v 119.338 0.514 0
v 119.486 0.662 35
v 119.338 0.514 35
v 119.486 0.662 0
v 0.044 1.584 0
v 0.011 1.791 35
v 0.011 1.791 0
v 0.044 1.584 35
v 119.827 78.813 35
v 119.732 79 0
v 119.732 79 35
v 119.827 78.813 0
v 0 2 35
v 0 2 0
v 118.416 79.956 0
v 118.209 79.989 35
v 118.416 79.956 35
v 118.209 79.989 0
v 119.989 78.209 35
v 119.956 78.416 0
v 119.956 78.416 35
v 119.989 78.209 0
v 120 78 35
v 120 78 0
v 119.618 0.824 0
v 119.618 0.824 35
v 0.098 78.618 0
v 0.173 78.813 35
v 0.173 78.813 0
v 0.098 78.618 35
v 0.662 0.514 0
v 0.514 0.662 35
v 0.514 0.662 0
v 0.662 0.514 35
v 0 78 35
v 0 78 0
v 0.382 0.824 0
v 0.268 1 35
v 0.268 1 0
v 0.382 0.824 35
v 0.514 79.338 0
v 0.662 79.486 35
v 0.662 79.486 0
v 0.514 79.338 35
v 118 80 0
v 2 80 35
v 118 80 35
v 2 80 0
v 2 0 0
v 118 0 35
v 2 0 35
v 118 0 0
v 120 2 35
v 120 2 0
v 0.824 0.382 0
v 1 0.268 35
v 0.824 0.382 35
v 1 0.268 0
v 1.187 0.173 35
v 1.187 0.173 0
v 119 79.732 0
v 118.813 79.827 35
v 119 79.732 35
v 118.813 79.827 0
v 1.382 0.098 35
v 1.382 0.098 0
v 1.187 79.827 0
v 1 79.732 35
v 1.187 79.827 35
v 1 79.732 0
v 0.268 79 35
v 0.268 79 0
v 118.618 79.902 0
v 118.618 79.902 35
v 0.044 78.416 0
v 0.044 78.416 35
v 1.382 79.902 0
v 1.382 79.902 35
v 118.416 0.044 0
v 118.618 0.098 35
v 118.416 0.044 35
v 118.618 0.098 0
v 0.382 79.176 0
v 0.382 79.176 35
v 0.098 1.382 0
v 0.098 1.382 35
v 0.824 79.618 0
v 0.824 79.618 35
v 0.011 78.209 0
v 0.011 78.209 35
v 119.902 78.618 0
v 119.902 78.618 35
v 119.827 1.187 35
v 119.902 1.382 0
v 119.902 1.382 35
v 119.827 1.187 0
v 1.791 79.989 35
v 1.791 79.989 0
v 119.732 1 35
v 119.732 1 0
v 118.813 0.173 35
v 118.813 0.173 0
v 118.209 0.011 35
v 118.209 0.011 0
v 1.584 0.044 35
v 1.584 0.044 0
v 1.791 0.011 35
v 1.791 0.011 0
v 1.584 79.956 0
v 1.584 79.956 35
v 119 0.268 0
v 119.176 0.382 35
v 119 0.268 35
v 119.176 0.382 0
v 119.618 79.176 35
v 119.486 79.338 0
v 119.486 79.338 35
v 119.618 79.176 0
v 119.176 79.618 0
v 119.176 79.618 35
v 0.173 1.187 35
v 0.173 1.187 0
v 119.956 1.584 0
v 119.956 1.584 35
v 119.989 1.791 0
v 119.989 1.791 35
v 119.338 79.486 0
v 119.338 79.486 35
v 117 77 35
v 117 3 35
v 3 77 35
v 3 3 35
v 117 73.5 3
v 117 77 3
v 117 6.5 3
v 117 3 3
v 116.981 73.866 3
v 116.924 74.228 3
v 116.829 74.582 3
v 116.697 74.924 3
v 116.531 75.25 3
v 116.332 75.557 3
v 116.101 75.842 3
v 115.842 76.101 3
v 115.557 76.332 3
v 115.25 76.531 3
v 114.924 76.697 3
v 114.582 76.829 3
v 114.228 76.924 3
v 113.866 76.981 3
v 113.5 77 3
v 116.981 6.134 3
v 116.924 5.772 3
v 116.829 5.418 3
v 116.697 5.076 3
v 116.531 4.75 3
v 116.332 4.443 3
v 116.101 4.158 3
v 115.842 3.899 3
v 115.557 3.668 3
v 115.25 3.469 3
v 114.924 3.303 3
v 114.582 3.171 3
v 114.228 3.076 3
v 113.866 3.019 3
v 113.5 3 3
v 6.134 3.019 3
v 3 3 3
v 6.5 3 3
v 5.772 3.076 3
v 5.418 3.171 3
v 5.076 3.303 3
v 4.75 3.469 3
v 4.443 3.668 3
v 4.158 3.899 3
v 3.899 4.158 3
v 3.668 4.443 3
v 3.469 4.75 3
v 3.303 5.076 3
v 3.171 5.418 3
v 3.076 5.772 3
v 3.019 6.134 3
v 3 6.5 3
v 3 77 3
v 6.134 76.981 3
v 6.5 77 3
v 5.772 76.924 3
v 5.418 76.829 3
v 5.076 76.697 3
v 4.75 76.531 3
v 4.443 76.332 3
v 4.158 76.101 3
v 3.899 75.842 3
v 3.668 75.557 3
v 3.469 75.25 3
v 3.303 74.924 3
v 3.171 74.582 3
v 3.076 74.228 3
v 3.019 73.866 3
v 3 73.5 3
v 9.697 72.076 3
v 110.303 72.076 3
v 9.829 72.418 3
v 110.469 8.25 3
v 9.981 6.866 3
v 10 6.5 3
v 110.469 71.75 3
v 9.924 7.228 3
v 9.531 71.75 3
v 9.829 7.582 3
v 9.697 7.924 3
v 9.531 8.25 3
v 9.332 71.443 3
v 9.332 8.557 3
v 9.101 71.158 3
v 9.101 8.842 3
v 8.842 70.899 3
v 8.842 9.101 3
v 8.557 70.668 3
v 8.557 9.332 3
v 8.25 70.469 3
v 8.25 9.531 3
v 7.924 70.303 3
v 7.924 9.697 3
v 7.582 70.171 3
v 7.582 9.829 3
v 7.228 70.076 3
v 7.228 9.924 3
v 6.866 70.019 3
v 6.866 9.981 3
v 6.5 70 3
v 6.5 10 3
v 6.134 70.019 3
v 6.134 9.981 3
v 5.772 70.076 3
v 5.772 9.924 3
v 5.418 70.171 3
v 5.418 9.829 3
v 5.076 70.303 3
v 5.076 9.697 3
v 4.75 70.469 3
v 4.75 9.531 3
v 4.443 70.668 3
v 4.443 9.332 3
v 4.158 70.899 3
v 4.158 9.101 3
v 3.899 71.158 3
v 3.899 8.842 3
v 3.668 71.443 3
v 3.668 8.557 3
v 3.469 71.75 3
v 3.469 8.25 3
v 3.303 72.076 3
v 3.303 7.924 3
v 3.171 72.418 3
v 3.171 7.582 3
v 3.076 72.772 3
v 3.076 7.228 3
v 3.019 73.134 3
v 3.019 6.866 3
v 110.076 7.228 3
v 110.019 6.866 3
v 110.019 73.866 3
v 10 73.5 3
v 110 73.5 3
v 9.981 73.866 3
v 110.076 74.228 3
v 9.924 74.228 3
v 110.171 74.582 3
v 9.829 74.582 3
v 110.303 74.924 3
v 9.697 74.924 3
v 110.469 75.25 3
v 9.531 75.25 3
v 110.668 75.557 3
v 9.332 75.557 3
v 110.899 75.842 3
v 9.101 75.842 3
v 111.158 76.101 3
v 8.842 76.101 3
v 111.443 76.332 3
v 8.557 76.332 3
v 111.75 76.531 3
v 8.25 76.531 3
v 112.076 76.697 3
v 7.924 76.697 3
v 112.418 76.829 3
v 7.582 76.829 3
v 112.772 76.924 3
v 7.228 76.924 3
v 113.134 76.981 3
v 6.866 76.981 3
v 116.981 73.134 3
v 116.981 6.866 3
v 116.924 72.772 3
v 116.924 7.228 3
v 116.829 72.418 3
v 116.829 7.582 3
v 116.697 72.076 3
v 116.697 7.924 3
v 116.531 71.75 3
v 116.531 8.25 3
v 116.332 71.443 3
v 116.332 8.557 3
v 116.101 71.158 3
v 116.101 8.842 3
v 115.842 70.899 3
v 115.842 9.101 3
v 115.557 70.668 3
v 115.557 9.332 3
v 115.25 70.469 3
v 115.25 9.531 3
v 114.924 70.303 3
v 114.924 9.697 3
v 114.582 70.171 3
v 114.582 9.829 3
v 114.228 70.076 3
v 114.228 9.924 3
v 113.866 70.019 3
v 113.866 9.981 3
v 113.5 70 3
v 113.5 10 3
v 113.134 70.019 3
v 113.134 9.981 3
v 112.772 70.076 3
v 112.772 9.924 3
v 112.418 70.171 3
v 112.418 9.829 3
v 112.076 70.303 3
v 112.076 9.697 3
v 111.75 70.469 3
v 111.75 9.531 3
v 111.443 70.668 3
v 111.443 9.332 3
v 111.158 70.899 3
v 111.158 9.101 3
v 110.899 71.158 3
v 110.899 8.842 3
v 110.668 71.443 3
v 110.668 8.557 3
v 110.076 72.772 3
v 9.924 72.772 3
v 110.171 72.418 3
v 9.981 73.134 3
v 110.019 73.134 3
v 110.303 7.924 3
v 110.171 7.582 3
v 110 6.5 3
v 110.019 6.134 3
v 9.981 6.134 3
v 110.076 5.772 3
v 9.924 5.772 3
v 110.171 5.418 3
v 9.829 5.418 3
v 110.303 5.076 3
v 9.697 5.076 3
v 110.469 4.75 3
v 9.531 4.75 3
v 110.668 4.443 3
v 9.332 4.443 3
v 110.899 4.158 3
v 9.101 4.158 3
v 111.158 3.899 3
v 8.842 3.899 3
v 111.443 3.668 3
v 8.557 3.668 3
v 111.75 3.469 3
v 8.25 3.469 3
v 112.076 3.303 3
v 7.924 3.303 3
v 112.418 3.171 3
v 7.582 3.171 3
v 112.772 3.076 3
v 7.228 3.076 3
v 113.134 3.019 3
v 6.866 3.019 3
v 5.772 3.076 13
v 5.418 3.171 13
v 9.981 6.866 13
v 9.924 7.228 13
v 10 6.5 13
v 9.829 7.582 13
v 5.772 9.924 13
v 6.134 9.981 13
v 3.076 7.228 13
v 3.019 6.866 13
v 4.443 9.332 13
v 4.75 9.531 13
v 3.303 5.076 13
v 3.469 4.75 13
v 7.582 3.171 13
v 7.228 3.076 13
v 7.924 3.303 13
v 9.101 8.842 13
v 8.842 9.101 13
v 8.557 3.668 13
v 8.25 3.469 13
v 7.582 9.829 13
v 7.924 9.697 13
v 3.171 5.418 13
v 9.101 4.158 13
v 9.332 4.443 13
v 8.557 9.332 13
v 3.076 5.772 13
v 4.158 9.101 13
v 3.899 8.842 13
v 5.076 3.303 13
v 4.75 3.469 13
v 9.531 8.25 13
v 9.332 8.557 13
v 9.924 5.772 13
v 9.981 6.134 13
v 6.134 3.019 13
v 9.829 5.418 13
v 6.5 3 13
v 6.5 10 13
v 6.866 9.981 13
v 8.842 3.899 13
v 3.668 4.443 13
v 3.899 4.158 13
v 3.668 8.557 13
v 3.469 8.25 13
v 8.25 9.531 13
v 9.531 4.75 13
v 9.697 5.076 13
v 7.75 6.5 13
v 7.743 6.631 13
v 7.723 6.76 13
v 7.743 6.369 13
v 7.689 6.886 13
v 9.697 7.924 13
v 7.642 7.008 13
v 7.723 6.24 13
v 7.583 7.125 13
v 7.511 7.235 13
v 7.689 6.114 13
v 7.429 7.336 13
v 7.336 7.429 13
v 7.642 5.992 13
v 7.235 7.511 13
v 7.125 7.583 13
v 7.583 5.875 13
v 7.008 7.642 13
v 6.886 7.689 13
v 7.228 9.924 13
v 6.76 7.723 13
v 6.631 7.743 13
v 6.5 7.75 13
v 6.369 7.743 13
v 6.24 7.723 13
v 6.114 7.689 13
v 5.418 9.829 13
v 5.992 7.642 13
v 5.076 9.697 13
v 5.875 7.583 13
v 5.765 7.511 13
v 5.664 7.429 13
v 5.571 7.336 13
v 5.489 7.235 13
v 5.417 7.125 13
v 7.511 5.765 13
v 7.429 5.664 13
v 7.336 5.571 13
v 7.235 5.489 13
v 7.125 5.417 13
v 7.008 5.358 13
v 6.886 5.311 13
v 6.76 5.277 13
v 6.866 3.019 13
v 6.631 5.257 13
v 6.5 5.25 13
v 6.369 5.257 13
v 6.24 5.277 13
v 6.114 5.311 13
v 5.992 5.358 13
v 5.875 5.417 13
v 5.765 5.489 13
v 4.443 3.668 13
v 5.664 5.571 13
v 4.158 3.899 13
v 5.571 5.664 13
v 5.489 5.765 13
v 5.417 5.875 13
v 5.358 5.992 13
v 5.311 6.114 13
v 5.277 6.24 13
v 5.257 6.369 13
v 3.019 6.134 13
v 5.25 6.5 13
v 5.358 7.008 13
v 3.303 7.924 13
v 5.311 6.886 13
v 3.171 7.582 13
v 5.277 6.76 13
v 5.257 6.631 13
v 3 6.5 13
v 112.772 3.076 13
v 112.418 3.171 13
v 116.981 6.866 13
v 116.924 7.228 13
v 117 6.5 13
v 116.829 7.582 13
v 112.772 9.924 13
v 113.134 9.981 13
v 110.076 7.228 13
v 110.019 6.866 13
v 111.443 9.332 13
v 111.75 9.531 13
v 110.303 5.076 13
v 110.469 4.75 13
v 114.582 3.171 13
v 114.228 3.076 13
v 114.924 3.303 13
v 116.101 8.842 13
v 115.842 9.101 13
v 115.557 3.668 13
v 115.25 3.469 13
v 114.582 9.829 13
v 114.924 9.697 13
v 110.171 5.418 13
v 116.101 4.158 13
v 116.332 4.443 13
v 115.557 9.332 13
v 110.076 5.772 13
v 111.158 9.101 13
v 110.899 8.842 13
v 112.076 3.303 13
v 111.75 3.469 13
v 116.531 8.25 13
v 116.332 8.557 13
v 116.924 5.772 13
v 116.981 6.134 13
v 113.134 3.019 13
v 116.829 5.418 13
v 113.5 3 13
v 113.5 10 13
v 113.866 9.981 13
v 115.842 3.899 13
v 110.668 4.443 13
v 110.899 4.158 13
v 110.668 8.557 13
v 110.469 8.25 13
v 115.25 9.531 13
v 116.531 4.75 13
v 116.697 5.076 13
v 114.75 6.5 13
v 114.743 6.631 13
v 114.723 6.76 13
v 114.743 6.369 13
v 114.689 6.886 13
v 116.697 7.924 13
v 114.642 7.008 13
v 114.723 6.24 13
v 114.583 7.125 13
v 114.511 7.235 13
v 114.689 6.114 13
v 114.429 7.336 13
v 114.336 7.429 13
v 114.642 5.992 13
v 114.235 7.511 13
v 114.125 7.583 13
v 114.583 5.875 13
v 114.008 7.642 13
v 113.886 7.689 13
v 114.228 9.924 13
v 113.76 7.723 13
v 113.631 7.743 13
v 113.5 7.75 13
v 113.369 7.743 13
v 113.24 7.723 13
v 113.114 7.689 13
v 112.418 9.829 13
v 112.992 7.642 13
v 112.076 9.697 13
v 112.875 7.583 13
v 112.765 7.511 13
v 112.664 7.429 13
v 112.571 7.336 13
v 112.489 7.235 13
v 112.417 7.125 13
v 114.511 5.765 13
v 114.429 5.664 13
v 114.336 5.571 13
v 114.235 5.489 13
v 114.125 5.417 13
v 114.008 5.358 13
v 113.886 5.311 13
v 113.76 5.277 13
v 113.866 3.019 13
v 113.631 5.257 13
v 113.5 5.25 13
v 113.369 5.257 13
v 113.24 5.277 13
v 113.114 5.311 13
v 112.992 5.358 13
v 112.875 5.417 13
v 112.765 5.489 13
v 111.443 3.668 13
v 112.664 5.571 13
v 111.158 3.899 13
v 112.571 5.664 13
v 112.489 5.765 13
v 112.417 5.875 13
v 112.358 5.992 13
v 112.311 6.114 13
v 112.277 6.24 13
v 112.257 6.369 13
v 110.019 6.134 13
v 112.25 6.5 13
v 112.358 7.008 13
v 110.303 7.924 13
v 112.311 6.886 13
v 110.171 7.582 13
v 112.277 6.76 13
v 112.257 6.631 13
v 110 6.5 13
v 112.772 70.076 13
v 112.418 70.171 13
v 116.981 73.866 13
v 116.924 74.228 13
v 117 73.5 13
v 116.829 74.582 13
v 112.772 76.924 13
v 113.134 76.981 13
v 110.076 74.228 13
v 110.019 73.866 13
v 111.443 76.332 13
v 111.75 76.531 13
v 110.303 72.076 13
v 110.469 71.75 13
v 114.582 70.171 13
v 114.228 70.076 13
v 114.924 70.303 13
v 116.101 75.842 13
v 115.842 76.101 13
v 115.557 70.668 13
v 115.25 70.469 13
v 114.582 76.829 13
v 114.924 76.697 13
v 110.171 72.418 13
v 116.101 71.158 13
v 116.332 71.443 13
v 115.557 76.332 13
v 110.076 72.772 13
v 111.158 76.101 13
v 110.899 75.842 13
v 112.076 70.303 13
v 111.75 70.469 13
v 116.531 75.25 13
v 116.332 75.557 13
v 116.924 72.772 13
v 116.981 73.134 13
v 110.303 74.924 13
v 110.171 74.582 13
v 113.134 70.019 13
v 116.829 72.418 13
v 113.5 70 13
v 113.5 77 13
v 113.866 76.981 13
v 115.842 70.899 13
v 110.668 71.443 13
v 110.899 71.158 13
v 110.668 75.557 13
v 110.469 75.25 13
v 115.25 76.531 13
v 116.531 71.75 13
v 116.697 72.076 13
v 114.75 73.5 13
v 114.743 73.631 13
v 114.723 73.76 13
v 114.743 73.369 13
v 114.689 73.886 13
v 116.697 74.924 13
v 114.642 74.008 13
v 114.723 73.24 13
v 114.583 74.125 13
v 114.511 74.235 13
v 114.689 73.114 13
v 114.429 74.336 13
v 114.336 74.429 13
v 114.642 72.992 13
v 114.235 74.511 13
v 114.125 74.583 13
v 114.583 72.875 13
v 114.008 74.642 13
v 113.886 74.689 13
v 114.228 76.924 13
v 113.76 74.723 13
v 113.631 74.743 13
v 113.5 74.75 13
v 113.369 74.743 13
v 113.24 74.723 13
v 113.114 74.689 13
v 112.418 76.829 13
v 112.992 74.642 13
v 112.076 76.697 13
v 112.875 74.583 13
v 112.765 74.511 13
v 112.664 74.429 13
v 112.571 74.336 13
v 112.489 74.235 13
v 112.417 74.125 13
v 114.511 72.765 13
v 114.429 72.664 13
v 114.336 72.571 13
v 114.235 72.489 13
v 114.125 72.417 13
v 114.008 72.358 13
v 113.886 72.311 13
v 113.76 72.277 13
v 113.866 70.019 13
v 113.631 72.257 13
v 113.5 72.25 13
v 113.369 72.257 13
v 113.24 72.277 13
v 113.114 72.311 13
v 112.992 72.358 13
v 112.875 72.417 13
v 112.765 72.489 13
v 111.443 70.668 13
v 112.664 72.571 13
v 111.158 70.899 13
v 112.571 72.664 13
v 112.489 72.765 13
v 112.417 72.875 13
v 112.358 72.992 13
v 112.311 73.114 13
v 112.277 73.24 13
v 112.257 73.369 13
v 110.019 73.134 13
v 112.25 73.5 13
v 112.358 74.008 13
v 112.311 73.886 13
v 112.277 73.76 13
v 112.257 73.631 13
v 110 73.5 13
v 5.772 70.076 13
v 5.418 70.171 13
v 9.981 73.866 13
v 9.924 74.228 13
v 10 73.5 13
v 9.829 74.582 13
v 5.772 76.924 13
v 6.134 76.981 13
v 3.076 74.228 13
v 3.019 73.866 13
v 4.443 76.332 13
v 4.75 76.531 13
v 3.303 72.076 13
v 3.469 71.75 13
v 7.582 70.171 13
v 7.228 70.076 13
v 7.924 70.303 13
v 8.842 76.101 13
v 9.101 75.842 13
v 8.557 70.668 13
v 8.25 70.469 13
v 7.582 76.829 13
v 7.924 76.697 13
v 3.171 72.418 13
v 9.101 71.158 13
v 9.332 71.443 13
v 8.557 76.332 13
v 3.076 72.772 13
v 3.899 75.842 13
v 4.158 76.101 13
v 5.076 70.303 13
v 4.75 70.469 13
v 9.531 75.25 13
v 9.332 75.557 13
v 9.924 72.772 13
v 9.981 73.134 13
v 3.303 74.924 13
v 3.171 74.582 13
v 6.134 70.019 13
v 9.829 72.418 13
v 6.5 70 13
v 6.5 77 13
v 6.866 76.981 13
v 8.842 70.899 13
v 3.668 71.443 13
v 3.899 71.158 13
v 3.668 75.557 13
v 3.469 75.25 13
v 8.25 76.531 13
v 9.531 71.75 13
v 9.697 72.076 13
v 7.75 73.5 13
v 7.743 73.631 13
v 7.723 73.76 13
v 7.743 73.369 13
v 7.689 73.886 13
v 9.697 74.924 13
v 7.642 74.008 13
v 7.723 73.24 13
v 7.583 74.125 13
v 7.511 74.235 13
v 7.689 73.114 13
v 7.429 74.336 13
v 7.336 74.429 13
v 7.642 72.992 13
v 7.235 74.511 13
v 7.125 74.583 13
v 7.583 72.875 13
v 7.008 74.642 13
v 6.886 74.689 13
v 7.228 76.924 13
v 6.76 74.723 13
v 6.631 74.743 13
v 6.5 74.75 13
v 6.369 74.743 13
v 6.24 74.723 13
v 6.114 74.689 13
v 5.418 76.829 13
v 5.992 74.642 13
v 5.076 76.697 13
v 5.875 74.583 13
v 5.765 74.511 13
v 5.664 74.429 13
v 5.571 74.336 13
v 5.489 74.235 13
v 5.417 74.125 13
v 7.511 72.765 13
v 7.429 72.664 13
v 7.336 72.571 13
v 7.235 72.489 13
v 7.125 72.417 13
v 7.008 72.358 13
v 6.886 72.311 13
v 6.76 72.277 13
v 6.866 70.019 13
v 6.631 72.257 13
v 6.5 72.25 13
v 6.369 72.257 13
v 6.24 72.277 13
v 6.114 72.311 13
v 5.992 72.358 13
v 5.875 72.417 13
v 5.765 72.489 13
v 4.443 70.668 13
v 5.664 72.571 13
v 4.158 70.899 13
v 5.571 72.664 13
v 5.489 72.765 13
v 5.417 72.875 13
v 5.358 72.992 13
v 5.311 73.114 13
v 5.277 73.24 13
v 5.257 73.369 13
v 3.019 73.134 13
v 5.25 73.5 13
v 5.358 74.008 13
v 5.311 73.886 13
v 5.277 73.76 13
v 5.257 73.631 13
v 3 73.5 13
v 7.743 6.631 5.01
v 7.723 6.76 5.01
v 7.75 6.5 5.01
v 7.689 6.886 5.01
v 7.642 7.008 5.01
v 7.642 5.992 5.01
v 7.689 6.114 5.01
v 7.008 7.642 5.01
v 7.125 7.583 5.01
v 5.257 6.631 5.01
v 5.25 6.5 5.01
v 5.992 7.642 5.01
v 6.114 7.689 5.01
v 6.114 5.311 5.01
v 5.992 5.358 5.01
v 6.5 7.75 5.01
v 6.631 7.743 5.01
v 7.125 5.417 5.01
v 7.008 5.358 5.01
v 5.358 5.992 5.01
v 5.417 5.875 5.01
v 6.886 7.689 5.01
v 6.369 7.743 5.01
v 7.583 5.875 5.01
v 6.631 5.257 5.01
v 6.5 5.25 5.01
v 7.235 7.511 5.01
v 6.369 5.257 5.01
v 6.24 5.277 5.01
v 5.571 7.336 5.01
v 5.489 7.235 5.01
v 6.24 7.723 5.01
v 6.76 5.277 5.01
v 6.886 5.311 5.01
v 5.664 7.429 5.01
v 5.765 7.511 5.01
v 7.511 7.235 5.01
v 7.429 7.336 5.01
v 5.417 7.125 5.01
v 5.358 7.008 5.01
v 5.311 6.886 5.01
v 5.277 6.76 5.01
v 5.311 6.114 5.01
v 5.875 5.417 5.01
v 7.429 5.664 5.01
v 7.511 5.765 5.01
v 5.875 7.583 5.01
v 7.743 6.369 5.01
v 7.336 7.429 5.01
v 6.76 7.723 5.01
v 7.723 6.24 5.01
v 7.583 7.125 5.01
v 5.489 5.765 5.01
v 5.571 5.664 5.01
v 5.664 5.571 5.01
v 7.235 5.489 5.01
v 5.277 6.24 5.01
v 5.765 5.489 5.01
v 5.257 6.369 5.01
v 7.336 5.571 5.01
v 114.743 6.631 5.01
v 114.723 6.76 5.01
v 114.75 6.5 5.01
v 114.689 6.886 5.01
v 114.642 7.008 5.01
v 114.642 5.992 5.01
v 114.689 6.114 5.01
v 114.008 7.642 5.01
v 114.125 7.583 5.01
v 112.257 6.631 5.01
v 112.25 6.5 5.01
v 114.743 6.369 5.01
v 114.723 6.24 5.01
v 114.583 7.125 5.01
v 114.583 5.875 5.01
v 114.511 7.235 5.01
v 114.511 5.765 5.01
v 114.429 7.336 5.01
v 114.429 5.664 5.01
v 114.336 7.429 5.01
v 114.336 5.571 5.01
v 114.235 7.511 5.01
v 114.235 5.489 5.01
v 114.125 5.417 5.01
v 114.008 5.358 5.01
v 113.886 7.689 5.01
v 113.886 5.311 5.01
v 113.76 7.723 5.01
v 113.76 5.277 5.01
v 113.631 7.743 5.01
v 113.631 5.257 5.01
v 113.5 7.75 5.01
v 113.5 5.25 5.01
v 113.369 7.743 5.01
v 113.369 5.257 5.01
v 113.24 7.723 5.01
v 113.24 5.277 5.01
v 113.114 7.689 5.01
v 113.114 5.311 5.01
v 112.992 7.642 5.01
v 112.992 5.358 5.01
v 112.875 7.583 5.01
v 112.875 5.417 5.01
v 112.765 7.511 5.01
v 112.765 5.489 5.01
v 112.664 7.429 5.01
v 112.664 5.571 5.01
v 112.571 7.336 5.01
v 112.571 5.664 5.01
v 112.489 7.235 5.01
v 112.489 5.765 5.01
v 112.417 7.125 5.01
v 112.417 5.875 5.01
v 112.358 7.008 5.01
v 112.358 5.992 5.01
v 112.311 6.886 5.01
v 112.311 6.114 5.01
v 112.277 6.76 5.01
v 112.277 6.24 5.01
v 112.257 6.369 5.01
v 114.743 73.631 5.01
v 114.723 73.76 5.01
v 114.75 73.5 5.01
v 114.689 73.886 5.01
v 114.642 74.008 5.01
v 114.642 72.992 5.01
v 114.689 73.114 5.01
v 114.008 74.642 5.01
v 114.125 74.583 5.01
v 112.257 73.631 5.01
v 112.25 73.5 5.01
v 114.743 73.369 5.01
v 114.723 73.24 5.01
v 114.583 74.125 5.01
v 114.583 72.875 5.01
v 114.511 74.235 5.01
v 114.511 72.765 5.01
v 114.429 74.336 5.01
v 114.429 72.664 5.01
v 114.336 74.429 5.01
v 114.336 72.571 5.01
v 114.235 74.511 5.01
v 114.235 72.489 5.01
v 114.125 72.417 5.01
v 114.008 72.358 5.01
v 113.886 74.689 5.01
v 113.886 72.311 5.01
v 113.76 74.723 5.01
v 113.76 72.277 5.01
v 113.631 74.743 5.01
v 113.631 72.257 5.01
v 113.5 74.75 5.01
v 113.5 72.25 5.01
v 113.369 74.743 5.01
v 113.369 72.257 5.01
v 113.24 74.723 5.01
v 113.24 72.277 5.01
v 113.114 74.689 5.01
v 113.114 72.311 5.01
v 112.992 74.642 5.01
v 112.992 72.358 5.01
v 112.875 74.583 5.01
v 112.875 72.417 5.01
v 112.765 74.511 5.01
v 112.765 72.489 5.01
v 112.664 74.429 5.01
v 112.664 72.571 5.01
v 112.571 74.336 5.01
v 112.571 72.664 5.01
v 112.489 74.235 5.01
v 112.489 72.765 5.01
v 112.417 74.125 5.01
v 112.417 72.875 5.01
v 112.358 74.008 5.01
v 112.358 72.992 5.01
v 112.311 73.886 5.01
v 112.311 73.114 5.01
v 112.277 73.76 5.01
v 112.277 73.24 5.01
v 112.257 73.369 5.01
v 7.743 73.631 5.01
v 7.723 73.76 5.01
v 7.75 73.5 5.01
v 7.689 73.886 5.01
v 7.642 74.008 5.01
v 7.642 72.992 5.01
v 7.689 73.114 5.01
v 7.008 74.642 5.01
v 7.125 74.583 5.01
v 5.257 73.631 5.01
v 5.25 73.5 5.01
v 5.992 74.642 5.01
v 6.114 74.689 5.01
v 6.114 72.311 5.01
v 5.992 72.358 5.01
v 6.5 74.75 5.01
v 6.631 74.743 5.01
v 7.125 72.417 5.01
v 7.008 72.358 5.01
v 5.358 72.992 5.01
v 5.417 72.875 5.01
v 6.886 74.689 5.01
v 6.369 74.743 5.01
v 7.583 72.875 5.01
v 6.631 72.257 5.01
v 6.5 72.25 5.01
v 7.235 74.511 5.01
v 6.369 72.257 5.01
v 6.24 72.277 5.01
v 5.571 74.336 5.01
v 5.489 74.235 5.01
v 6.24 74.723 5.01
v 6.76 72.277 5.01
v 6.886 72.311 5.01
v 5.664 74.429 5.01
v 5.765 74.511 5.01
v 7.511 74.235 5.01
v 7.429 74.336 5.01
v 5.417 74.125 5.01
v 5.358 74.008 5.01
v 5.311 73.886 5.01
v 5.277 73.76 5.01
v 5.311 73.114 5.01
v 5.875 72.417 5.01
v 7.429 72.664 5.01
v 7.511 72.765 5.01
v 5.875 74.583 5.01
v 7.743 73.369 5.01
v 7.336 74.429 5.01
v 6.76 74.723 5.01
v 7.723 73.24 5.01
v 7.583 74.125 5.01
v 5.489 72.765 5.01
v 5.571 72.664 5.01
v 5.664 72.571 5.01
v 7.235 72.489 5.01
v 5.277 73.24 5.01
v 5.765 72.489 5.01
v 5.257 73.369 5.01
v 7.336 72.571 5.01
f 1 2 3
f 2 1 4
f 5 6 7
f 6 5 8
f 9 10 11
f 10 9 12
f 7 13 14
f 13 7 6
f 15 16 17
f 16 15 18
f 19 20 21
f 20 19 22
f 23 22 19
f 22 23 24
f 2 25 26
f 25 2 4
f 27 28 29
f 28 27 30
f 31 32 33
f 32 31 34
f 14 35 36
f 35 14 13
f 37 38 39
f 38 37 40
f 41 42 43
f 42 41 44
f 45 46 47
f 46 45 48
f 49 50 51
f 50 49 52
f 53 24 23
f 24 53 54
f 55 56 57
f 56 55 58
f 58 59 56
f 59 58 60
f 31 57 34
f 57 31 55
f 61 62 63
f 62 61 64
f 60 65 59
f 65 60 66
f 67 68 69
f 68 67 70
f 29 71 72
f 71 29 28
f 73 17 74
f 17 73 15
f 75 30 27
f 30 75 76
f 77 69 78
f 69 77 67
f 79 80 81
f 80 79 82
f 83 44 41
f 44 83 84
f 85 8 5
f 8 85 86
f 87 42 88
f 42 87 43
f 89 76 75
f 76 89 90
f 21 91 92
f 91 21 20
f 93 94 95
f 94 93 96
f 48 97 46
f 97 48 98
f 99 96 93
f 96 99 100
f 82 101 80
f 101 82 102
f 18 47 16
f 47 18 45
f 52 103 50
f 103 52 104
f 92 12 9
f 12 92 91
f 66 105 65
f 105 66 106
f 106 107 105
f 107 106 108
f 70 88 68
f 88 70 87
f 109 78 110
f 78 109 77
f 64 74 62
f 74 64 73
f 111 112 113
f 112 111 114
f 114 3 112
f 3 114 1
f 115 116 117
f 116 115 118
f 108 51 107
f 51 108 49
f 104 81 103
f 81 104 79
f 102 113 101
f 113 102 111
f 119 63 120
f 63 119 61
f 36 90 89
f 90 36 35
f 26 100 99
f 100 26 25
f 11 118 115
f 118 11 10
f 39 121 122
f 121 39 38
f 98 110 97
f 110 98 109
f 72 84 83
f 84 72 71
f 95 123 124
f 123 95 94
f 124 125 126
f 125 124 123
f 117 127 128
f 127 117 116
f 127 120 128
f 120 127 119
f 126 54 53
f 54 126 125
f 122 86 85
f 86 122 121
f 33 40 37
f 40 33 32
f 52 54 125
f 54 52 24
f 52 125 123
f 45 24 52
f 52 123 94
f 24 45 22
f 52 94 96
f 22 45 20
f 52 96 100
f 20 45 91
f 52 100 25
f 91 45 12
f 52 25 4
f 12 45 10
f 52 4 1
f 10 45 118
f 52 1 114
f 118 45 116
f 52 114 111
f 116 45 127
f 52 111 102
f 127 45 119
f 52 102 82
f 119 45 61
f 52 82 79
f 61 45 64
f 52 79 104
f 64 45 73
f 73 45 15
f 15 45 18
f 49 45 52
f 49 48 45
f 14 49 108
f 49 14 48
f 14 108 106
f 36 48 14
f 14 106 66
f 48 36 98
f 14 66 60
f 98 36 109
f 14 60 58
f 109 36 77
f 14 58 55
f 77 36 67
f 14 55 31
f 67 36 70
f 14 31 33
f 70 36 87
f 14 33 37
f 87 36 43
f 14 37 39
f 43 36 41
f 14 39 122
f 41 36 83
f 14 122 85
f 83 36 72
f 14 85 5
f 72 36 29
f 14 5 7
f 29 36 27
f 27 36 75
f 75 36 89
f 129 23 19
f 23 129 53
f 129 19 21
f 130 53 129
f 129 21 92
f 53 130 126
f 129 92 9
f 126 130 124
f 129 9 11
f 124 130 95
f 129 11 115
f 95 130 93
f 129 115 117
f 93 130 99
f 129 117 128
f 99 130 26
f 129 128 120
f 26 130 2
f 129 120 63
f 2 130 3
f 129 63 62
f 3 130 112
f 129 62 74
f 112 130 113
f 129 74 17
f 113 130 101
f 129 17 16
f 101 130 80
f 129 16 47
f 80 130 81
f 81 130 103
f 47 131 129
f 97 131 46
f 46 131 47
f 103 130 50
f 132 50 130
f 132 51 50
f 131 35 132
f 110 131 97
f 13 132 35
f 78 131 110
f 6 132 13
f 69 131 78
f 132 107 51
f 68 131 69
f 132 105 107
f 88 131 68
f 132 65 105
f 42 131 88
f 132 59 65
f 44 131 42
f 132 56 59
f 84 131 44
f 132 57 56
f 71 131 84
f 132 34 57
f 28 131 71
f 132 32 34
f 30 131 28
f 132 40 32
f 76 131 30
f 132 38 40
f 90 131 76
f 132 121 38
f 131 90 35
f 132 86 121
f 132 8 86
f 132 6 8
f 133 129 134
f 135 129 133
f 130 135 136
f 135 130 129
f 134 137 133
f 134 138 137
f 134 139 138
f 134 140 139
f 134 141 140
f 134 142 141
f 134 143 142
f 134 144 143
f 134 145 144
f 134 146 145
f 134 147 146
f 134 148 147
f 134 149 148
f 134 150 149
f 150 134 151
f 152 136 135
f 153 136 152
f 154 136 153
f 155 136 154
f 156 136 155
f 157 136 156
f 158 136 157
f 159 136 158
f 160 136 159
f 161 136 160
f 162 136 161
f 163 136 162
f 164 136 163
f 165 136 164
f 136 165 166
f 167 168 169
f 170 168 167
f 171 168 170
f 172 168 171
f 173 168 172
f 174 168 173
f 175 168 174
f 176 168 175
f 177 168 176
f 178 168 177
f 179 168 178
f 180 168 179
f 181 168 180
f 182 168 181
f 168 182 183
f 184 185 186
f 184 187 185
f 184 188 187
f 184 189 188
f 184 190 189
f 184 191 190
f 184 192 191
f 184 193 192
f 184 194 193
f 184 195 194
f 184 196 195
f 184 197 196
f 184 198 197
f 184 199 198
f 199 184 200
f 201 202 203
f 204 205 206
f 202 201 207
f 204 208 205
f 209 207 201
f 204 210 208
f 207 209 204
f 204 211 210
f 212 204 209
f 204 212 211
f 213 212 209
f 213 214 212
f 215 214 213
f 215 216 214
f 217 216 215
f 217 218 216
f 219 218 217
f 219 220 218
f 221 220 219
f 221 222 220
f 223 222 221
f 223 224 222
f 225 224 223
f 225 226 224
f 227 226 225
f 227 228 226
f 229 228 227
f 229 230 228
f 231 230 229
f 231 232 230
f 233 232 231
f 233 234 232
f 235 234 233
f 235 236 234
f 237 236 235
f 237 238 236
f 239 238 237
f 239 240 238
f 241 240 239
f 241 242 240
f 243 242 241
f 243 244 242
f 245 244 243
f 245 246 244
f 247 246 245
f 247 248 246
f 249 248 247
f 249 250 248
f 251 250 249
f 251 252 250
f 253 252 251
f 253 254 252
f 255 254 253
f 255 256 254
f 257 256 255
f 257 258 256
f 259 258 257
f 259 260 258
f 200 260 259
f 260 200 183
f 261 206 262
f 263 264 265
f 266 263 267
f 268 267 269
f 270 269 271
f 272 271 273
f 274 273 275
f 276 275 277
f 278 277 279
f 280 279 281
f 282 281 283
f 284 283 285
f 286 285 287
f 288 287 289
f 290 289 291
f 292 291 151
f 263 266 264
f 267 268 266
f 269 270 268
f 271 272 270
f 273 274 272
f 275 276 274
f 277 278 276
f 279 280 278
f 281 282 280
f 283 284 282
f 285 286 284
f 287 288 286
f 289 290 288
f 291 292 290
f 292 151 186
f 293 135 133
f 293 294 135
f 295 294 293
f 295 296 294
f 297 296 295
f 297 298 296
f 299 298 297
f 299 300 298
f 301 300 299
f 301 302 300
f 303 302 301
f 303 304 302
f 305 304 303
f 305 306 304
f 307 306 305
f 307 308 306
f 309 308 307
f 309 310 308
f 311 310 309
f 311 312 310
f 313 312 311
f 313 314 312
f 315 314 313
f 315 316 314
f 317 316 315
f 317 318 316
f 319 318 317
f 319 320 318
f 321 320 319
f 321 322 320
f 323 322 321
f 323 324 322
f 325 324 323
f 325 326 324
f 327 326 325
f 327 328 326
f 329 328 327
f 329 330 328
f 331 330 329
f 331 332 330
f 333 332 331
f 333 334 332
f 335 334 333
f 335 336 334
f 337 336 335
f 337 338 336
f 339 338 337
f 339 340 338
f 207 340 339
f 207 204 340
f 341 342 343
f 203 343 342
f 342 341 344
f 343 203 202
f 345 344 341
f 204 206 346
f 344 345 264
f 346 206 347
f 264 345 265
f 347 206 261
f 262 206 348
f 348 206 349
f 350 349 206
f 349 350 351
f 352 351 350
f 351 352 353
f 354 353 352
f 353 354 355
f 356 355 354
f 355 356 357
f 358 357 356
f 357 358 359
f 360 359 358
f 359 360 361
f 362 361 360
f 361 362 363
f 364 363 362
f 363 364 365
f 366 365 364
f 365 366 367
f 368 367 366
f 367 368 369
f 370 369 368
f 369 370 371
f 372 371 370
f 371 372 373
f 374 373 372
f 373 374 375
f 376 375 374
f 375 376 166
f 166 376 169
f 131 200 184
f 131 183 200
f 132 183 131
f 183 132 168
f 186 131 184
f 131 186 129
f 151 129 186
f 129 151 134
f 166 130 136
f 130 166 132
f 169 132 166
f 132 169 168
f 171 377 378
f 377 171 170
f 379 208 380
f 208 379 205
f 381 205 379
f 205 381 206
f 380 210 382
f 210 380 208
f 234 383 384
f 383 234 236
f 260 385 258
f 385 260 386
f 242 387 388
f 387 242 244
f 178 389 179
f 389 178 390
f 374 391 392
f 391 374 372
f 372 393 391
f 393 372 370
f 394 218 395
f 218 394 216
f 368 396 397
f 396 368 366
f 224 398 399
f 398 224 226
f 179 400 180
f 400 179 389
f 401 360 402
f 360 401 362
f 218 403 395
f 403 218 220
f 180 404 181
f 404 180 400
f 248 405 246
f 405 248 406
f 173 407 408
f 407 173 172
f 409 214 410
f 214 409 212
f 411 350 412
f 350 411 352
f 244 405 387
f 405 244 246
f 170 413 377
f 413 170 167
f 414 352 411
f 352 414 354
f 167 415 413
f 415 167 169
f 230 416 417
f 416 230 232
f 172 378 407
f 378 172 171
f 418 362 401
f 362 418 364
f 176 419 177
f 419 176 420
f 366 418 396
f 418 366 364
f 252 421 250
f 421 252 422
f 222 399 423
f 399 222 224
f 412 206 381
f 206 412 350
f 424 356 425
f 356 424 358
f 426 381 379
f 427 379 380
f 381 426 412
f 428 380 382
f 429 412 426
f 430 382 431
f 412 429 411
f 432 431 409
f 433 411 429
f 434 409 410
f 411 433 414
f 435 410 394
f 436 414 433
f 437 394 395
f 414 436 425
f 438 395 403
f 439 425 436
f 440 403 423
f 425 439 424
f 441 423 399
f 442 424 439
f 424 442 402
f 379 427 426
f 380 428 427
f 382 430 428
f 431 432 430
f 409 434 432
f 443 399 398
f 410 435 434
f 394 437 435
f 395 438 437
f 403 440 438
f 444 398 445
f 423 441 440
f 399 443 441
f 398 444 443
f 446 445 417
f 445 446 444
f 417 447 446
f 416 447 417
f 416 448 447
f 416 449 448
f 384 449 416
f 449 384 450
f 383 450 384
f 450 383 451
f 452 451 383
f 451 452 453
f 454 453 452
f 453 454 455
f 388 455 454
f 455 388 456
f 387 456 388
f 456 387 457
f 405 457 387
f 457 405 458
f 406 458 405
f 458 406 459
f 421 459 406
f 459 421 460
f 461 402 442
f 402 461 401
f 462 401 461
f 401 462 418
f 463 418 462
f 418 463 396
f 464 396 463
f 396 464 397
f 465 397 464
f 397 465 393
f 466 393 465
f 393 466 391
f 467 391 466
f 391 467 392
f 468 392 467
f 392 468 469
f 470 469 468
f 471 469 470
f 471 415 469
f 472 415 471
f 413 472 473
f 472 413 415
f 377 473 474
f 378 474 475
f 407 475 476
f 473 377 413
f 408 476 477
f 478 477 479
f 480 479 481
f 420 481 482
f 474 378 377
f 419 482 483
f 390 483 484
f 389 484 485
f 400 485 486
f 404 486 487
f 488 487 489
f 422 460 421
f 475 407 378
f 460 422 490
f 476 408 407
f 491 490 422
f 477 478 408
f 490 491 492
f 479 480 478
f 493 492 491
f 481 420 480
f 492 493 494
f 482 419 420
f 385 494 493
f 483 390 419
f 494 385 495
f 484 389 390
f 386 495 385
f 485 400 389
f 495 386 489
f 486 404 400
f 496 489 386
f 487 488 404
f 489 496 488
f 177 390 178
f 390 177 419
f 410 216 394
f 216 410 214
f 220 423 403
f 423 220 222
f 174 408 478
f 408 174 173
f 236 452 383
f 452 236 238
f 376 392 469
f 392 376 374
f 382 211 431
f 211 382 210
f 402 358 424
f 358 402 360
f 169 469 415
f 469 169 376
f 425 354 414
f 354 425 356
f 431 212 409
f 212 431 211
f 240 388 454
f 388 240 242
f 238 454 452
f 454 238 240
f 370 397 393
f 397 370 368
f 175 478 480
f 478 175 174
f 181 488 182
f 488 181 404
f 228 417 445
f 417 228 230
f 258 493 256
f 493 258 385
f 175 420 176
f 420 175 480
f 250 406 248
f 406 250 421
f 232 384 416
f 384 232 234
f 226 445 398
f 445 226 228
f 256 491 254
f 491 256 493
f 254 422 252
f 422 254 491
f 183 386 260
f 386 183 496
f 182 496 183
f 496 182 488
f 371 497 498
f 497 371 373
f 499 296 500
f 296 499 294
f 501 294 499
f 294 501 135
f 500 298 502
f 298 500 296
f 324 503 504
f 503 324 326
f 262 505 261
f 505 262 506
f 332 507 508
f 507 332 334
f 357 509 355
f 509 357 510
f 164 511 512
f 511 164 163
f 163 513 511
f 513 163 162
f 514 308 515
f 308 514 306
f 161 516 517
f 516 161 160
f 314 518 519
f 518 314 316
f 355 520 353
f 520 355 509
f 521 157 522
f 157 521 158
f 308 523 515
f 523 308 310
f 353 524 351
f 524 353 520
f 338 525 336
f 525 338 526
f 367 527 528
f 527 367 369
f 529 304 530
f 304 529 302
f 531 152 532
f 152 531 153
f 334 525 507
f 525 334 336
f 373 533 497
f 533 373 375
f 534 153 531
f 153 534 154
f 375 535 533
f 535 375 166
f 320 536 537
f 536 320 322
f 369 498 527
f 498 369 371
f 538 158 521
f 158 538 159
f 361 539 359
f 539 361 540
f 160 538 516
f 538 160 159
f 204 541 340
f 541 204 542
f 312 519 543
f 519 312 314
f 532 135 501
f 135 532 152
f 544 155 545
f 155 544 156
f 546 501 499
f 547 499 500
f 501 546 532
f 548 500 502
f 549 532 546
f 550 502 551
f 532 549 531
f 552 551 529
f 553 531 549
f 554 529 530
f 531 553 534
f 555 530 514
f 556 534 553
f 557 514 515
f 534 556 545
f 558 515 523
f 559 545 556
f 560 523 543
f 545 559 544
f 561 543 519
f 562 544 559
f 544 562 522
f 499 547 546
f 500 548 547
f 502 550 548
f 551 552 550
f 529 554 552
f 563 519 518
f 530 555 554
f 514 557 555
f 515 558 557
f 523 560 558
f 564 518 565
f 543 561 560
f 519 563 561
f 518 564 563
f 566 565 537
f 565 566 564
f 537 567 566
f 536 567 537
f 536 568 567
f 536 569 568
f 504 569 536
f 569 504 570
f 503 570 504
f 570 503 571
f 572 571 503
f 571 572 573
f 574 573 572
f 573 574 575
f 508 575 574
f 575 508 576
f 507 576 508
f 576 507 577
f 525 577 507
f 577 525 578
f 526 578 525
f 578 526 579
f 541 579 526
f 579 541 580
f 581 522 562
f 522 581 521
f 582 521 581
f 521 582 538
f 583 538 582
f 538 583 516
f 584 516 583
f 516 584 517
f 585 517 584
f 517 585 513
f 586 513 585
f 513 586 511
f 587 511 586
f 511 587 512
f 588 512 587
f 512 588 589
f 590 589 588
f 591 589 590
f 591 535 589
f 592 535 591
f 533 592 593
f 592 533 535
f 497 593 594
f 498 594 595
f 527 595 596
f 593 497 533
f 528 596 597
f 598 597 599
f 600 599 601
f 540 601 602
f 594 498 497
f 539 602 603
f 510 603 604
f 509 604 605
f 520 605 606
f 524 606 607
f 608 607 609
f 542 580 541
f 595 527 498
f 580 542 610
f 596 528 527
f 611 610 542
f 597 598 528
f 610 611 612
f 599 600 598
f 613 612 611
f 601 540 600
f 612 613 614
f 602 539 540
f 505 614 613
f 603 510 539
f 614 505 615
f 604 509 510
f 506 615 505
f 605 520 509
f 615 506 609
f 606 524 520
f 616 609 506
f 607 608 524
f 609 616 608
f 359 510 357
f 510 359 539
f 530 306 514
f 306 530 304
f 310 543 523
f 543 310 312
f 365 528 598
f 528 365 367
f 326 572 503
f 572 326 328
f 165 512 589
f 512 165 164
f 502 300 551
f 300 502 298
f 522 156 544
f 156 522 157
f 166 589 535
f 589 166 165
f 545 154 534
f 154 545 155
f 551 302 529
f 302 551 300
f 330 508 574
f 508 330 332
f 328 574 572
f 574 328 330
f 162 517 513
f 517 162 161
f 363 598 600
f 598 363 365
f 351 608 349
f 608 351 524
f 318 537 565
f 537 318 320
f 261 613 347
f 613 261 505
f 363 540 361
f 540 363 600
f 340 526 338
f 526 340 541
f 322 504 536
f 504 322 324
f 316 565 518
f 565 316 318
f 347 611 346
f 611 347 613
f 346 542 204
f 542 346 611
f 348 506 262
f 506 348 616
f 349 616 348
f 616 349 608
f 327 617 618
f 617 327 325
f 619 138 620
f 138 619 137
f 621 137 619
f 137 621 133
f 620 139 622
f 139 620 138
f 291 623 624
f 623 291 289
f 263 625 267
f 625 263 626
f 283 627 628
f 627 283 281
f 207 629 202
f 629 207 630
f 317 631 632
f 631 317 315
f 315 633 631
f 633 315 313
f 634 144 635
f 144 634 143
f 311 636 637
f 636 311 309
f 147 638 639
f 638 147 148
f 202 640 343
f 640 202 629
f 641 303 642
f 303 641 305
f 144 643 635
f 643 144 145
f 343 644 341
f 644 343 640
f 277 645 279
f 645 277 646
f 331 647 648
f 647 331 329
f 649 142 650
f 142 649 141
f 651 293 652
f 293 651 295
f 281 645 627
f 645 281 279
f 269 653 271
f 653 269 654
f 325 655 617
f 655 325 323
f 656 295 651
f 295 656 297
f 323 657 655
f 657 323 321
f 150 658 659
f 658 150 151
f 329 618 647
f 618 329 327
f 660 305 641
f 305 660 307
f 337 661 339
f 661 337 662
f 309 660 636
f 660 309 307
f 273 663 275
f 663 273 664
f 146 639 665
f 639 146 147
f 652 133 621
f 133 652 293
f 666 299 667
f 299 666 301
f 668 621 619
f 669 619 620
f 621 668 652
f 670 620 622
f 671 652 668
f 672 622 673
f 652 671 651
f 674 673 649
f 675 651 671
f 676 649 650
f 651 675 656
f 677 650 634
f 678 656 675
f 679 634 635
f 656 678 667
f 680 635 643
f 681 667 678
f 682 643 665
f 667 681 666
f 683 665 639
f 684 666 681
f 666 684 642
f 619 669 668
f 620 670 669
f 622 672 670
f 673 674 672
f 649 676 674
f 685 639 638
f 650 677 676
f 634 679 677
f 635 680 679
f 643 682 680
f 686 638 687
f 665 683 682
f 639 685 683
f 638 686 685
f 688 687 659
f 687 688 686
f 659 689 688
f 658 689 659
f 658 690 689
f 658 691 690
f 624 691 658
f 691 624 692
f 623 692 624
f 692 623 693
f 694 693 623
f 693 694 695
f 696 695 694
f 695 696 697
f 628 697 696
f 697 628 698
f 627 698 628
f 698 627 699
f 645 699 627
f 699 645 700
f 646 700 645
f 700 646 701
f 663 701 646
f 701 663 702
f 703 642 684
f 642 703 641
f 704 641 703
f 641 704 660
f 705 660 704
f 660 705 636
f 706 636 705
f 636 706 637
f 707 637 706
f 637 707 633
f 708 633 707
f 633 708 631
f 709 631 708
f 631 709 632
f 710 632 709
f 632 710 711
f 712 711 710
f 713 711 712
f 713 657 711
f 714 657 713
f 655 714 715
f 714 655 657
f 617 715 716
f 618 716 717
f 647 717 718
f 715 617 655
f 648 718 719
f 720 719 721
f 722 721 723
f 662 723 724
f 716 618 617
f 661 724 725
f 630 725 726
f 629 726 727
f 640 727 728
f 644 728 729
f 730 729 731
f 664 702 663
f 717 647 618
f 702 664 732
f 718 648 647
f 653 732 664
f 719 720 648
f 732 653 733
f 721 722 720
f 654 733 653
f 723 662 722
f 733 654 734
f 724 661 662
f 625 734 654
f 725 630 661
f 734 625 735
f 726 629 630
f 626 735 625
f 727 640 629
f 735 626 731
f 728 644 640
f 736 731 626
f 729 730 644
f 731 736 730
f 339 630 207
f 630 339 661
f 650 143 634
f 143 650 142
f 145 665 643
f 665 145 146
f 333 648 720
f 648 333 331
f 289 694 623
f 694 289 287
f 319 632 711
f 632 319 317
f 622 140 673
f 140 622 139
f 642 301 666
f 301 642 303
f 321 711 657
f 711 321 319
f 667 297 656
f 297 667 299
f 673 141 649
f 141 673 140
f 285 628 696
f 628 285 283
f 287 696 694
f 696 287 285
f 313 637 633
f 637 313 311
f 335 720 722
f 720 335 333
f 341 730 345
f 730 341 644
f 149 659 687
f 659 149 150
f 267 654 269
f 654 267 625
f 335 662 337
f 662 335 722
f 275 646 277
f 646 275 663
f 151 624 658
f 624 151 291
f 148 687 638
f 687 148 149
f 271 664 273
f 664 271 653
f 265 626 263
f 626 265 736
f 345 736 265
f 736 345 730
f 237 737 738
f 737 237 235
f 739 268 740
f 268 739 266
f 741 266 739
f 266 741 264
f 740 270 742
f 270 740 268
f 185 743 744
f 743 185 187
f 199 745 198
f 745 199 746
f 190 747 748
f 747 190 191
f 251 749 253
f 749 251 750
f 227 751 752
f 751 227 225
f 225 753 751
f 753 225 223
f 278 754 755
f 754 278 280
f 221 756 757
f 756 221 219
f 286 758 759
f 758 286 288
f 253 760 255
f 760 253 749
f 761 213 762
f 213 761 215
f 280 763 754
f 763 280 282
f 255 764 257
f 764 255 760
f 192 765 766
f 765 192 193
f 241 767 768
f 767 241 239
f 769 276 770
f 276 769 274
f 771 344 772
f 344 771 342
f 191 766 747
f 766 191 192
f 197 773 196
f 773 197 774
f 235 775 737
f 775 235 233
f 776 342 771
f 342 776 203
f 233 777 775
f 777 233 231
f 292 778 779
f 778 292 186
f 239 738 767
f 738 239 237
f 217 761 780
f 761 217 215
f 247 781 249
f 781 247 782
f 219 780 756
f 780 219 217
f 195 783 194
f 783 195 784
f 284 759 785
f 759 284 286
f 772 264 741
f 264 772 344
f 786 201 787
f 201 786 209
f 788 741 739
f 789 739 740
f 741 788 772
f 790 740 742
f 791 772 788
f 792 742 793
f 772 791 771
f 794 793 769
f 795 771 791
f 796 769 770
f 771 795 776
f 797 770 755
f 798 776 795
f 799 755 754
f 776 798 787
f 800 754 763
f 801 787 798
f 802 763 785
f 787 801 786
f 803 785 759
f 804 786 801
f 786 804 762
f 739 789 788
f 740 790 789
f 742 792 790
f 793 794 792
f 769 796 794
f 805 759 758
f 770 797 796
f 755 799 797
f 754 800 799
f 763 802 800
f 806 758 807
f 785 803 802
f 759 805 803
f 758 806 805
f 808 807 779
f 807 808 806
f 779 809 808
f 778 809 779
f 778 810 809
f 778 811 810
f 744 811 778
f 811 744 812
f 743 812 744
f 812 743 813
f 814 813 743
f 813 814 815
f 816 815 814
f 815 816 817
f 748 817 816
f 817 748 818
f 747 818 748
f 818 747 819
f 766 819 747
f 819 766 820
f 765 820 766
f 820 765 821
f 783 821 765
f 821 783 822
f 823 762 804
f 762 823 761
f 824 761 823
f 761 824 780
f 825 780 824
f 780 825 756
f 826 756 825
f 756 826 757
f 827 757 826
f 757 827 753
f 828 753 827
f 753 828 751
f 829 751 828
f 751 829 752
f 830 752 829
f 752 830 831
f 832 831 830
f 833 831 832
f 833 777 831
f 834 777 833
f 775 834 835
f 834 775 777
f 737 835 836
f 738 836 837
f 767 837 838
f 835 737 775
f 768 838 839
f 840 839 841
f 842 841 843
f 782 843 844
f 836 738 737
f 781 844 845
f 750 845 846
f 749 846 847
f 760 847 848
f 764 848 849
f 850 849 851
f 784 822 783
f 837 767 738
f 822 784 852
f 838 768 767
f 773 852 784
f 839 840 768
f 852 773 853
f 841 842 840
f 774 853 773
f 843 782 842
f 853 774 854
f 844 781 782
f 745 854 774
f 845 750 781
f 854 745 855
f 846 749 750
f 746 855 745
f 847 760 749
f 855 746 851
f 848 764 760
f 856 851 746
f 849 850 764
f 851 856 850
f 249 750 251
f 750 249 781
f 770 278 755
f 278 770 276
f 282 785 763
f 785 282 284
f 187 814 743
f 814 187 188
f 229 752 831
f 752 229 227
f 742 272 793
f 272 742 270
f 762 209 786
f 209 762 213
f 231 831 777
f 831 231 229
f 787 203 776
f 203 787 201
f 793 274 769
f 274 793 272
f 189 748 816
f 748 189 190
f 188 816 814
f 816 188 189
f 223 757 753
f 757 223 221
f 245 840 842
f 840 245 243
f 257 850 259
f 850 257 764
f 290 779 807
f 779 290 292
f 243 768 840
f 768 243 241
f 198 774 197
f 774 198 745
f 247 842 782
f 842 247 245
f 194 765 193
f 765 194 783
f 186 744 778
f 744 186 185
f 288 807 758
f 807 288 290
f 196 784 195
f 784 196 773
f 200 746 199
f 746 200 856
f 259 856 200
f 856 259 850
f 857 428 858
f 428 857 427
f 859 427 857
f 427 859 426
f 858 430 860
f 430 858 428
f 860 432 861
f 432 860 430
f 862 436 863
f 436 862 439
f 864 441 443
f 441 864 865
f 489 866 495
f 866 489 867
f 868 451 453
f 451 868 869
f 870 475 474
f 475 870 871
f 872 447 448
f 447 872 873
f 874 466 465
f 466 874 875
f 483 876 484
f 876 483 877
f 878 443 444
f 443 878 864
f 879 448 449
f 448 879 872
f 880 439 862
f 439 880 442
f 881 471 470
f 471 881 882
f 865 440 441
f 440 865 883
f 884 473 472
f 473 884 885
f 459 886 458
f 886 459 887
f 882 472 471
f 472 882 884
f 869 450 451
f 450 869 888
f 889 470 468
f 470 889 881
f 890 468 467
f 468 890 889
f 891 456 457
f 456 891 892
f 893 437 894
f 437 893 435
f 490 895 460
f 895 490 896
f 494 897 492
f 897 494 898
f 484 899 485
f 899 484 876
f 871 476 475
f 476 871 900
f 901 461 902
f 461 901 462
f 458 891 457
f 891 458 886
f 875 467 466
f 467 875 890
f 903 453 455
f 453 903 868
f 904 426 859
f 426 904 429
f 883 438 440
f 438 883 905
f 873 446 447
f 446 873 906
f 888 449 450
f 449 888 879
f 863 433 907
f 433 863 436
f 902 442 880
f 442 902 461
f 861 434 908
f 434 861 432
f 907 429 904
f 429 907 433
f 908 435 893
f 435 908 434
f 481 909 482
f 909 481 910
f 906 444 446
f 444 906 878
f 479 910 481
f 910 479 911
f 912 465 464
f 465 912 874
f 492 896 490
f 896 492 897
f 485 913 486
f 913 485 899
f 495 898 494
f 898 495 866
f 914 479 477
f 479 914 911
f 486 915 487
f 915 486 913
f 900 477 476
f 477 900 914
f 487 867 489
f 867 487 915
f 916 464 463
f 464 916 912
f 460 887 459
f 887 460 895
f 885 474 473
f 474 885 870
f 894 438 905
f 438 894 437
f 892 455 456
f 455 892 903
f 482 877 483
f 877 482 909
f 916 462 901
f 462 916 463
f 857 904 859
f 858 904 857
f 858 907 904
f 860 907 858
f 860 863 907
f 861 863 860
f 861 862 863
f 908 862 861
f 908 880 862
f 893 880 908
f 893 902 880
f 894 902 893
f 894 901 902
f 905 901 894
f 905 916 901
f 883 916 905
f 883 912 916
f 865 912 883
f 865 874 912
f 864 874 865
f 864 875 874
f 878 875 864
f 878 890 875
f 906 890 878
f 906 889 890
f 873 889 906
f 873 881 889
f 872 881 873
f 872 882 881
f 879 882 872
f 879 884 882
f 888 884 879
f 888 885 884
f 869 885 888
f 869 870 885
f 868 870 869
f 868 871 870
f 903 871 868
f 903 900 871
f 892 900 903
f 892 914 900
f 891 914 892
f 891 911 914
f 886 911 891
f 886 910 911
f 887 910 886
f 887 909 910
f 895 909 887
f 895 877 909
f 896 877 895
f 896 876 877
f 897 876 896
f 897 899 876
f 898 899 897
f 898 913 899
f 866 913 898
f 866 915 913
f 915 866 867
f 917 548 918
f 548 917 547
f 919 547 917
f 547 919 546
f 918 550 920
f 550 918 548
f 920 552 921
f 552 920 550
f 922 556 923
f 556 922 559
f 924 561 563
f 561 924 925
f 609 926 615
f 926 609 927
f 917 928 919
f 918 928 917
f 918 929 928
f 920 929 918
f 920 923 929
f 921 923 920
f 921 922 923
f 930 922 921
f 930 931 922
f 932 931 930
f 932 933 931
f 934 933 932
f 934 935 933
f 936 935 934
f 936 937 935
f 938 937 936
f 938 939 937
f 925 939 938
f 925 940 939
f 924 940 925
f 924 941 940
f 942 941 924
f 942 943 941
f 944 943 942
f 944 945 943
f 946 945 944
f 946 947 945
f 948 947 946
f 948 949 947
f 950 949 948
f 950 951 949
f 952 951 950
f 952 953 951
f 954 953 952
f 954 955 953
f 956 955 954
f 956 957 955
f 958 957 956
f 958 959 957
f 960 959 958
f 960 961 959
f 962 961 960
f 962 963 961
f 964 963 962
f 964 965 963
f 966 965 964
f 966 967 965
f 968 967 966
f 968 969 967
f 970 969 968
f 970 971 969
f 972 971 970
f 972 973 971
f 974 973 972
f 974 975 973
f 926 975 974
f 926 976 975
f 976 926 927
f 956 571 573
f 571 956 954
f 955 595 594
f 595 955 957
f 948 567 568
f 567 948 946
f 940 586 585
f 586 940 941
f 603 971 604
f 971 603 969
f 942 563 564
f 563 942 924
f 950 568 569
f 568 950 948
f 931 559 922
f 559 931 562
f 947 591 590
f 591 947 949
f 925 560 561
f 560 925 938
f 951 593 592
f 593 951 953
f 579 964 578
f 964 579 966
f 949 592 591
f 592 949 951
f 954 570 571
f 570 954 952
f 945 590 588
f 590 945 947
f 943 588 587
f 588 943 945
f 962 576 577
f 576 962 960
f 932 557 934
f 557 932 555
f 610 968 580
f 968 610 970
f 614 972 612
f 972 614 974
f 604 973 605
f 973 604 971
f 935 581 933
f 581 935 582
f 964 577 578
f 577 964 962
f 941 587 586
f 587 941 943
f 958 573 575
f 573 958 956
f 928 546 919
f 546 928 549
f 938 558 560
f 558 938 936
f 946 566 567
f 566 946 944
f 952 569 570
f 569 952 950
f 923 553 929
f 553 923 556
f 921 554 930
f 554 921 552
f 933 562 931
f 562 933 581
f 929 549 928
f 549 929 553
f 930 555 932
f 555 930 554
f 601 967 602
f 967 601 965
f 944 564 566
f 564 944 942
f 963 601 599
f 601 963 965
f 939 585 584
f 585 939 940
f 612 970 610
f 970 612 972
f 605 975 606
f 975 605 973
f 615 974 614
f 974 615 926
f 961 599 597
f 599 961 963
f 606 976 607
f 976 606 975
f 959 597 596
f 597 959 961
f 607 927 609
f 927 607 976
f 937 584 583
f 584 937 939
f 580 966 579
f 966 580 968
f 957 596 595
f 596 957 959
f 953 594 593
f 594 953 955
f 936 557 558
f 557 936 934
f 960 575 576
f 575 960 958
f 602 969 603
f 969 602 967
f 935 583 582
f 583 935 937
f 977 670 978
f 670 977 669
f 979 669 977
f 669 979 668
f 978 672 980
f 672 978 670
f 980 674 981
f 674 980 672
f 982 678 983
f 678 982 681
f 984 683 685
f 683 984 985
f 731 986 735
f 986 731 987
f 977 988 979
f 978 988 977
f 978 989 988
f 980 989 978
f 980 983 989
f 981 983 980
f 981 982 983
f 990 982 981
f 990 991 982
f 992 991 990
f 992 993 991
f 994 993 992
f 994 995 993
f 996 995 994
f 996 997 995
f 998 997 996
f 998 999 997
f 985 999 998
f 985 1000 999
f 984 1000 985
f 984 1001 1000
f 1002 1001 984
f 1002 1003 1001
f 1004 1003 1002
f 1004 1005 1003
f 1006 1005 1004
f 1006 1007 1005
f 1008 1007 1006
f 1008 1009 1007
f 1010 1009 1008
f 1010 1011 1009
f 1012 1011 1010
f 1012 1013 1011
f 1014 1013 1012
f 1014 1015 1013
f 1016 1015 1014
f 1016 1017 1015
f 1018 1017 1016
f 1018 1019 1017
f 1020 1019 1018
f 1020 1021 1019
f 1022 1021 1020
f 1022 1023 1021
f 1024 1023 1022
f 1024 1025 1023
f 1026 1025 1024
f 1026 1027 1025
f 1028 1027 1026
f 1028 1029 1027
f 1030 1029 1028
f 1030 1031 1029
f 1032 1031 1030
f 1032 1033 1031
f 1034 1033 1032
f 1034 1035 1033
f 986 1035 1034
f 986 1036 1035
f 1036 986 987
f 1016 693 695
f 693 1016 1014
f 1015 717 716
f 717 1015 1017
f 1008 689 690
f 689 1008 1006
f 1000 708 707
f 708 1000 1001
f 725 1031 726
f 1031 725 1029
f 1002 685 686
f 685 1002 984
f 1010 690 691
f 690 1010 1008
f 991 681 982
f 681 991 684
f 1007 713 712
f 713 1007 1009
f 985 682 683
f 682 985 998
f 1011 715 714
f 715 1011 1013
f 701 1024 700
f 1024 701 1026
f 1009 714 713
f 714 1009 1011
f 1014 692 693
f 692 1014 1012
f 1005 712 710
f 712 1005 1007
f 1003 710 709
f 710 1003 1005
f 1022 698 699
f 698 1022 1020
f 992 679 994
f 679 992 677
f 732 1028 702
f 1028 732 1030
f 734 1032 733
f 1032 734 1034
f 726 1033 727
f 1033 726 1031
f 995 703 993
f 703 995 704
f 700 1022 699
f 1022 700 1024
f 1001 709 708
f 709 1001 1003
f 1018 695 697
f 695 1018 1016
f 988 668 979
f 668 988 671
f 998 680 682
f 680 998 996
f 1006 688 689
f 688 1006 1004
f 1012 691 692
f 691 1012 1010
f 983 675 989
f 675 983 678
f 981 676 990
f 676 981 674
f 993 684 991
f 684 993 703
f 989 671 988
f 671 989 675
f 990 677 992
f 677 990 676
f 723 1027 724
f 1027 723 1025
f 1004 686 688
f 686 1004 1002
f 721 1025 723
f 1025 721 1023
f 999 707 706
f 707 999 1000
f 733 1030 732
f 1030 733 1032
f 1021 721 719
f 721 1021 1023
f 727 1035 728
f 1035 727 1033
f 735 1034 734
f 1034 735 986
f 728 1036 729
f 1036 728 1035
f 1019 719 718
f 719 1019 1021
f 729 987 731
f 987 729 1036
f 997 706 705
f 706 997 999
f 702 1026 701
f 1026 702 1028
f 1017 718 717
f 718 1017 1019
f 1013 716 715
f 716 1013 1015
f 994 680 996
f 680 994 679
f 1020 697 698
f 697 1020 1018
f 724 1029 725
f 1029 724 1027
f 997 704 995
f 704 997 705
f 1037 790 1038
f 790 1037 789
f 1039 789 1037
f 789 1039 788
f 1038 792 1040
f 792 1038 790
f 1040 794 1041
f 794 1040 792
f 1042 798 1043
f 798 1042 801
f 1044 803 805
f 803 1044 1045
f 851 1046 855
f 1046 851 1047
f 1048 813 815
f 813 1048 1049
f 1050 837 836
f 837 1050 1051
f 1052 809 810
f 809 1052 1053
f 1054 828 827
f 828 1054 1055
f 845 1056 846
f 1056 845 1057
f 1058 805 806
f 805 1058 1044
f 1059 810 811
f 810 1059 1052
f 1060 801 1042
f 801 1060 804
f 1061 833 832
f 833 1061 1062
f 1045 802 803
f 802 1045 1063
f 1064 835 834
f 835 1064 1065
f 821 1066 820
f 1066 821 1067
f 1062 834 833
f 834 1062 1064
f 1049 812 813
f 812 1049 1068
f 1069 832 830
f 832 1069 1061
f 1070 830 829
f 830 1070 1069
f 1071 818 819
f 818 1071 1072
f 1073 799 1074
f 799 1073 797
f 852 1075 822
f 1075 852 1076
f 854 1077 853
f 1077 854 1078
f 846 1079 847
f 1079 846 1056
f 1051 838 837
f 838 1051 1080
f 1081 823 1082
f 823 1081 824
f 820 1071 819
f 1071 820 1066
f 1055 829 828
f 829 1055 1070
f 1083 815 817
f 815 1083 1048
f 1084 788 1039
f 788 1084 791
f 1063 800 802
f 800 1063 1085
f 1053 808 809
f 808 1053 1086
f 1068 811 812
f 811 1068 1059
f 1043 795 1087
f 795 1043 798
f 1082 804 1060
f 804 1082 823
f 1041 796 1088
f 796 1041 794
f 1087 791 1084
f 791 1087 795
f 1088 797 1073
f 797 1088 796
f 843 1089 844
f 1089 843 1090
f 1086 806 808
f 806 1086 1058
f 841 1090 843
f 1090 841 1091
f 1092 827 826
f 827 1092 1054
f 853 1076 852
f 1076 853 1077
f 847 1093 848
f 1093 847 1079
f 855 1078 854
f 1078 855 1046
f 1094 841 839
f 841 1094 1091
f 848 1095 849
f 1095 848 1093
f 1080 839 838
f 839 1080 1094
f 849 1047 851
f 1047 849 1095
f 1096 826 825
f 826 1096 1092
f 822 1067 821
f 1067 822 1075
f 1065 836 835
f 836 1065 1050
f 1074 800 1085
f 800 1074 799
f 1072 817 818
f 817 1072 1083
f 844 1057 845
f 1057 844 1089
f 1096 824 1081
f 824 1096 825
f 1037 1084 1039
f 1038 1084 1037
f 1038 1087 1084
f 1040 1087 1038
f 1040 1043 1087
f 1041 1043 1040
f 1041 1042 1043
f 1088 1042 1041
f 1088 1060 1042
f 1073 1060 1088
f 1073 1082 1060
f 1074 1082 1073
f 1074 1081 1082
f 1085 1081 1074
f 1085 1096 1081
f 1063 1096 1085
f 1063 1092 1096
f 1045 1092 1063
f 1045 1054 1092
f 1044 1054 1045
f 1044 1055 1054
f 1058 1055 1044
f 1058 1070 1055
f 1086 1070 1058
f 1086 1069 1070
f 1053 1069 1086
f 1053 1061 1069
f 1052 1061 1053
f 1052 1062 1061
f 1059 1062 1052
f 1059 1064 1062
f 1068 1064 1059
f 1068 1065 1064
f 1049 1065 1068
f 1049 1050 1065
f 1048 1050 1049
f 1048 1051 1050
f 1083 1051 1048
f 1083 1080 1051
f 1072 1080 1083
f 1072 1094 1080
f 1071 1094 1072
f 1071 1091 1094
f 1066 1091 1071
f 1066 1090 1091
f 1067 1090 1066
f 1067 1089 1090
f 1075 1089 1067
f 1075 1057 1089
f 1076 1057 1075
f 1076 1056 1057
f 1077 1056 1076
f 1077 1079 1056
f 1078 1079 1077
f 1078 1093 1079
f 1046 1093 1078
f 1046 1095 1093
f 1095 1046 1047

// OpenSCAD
// Open-top rectangular enclosure with rounded corners and mounting standoffs
// Dimensions: 120 x 80 x 35 mm

$fn = 60;

// Main Enclosure Dimensions
outer_length = 120;
outer_width  = 80;
total_height = 35;
corner_radius = 2;

// Wall and Floor Thicknesses
wall_thickness  = 3;
floor_thickness = 3;

// Internal Standoff Dimensions
standoff_od     = 7;    // Outer diameter of standoffs
hole_diameter   = 2.5;  // Blind hole diameter
hole_depth      = 8;    // Depth of blind hole
standoff_height = 10;   // Height of standoff above floor

// Calculated Inner Dimensions
inner_length = outer_length - 2 * wall_thickness;
inner_width  = outer_width  - 2 * wall_thickness;

// Positions for internal corner standoffs
standoff_x_off = wall_thickness + standoff_od / 2;
standoff_y_off = wall_thickness + standoff_od / 2;

standoff_positions = [
    [standoff_x_off, standoff_y_off],
    [outer_length - standoff_x_off, standoff_y_off],
    [outer_length - standoff_x_off, outer_width - standoff_y_off],
    [standoff_x_off, outer_width - standoff_y_off]
];

// Helper module for rounded 2D rectangle
module rounded_rect_2d(l, w, r) {
    hull() {
        translate([r, r]) circle(r = r);
        translate([l - r, r]) circle(r = r);
        translate([l - r, w - r]) circle(r = r);
        translate([r, w - r]) circle(r = r);
    }
}

// Main Assembly
difference() {
    union() {
        // Outer Shell with Hollow Interior
        difference() {
            // Solid Rounded Outer Box
            linear_extrude(height = total_height) {
                rounded_rect_2d(outer_length, outer_width, corner_radius);
            }
            
            // Hollow Cavity
            translate([wall_thickness, wall_thickness, floor_thickness]) {
                cube([inner_length, inner_width, total_height - floor_thickness + 1]);
            }
        }
        
        // Add Standoff Columns
        for (pos = standoff_positions) {
            translate([pos[0], pos[1], floor_thickness]) {
                cylinder(d = standoff_od, h = standoff_height);
            }
        }
    }
    
    // Subtract Centered Blind Holes in Standoffs
    for (pos = standoff_positions) {
        translate([pos[0], pos[1], floor_thickness + standoff_height - hole_depth + 0.01]) {
            cylinder(d = hole_diameter, h = hole_depth);
        }
    }
}
